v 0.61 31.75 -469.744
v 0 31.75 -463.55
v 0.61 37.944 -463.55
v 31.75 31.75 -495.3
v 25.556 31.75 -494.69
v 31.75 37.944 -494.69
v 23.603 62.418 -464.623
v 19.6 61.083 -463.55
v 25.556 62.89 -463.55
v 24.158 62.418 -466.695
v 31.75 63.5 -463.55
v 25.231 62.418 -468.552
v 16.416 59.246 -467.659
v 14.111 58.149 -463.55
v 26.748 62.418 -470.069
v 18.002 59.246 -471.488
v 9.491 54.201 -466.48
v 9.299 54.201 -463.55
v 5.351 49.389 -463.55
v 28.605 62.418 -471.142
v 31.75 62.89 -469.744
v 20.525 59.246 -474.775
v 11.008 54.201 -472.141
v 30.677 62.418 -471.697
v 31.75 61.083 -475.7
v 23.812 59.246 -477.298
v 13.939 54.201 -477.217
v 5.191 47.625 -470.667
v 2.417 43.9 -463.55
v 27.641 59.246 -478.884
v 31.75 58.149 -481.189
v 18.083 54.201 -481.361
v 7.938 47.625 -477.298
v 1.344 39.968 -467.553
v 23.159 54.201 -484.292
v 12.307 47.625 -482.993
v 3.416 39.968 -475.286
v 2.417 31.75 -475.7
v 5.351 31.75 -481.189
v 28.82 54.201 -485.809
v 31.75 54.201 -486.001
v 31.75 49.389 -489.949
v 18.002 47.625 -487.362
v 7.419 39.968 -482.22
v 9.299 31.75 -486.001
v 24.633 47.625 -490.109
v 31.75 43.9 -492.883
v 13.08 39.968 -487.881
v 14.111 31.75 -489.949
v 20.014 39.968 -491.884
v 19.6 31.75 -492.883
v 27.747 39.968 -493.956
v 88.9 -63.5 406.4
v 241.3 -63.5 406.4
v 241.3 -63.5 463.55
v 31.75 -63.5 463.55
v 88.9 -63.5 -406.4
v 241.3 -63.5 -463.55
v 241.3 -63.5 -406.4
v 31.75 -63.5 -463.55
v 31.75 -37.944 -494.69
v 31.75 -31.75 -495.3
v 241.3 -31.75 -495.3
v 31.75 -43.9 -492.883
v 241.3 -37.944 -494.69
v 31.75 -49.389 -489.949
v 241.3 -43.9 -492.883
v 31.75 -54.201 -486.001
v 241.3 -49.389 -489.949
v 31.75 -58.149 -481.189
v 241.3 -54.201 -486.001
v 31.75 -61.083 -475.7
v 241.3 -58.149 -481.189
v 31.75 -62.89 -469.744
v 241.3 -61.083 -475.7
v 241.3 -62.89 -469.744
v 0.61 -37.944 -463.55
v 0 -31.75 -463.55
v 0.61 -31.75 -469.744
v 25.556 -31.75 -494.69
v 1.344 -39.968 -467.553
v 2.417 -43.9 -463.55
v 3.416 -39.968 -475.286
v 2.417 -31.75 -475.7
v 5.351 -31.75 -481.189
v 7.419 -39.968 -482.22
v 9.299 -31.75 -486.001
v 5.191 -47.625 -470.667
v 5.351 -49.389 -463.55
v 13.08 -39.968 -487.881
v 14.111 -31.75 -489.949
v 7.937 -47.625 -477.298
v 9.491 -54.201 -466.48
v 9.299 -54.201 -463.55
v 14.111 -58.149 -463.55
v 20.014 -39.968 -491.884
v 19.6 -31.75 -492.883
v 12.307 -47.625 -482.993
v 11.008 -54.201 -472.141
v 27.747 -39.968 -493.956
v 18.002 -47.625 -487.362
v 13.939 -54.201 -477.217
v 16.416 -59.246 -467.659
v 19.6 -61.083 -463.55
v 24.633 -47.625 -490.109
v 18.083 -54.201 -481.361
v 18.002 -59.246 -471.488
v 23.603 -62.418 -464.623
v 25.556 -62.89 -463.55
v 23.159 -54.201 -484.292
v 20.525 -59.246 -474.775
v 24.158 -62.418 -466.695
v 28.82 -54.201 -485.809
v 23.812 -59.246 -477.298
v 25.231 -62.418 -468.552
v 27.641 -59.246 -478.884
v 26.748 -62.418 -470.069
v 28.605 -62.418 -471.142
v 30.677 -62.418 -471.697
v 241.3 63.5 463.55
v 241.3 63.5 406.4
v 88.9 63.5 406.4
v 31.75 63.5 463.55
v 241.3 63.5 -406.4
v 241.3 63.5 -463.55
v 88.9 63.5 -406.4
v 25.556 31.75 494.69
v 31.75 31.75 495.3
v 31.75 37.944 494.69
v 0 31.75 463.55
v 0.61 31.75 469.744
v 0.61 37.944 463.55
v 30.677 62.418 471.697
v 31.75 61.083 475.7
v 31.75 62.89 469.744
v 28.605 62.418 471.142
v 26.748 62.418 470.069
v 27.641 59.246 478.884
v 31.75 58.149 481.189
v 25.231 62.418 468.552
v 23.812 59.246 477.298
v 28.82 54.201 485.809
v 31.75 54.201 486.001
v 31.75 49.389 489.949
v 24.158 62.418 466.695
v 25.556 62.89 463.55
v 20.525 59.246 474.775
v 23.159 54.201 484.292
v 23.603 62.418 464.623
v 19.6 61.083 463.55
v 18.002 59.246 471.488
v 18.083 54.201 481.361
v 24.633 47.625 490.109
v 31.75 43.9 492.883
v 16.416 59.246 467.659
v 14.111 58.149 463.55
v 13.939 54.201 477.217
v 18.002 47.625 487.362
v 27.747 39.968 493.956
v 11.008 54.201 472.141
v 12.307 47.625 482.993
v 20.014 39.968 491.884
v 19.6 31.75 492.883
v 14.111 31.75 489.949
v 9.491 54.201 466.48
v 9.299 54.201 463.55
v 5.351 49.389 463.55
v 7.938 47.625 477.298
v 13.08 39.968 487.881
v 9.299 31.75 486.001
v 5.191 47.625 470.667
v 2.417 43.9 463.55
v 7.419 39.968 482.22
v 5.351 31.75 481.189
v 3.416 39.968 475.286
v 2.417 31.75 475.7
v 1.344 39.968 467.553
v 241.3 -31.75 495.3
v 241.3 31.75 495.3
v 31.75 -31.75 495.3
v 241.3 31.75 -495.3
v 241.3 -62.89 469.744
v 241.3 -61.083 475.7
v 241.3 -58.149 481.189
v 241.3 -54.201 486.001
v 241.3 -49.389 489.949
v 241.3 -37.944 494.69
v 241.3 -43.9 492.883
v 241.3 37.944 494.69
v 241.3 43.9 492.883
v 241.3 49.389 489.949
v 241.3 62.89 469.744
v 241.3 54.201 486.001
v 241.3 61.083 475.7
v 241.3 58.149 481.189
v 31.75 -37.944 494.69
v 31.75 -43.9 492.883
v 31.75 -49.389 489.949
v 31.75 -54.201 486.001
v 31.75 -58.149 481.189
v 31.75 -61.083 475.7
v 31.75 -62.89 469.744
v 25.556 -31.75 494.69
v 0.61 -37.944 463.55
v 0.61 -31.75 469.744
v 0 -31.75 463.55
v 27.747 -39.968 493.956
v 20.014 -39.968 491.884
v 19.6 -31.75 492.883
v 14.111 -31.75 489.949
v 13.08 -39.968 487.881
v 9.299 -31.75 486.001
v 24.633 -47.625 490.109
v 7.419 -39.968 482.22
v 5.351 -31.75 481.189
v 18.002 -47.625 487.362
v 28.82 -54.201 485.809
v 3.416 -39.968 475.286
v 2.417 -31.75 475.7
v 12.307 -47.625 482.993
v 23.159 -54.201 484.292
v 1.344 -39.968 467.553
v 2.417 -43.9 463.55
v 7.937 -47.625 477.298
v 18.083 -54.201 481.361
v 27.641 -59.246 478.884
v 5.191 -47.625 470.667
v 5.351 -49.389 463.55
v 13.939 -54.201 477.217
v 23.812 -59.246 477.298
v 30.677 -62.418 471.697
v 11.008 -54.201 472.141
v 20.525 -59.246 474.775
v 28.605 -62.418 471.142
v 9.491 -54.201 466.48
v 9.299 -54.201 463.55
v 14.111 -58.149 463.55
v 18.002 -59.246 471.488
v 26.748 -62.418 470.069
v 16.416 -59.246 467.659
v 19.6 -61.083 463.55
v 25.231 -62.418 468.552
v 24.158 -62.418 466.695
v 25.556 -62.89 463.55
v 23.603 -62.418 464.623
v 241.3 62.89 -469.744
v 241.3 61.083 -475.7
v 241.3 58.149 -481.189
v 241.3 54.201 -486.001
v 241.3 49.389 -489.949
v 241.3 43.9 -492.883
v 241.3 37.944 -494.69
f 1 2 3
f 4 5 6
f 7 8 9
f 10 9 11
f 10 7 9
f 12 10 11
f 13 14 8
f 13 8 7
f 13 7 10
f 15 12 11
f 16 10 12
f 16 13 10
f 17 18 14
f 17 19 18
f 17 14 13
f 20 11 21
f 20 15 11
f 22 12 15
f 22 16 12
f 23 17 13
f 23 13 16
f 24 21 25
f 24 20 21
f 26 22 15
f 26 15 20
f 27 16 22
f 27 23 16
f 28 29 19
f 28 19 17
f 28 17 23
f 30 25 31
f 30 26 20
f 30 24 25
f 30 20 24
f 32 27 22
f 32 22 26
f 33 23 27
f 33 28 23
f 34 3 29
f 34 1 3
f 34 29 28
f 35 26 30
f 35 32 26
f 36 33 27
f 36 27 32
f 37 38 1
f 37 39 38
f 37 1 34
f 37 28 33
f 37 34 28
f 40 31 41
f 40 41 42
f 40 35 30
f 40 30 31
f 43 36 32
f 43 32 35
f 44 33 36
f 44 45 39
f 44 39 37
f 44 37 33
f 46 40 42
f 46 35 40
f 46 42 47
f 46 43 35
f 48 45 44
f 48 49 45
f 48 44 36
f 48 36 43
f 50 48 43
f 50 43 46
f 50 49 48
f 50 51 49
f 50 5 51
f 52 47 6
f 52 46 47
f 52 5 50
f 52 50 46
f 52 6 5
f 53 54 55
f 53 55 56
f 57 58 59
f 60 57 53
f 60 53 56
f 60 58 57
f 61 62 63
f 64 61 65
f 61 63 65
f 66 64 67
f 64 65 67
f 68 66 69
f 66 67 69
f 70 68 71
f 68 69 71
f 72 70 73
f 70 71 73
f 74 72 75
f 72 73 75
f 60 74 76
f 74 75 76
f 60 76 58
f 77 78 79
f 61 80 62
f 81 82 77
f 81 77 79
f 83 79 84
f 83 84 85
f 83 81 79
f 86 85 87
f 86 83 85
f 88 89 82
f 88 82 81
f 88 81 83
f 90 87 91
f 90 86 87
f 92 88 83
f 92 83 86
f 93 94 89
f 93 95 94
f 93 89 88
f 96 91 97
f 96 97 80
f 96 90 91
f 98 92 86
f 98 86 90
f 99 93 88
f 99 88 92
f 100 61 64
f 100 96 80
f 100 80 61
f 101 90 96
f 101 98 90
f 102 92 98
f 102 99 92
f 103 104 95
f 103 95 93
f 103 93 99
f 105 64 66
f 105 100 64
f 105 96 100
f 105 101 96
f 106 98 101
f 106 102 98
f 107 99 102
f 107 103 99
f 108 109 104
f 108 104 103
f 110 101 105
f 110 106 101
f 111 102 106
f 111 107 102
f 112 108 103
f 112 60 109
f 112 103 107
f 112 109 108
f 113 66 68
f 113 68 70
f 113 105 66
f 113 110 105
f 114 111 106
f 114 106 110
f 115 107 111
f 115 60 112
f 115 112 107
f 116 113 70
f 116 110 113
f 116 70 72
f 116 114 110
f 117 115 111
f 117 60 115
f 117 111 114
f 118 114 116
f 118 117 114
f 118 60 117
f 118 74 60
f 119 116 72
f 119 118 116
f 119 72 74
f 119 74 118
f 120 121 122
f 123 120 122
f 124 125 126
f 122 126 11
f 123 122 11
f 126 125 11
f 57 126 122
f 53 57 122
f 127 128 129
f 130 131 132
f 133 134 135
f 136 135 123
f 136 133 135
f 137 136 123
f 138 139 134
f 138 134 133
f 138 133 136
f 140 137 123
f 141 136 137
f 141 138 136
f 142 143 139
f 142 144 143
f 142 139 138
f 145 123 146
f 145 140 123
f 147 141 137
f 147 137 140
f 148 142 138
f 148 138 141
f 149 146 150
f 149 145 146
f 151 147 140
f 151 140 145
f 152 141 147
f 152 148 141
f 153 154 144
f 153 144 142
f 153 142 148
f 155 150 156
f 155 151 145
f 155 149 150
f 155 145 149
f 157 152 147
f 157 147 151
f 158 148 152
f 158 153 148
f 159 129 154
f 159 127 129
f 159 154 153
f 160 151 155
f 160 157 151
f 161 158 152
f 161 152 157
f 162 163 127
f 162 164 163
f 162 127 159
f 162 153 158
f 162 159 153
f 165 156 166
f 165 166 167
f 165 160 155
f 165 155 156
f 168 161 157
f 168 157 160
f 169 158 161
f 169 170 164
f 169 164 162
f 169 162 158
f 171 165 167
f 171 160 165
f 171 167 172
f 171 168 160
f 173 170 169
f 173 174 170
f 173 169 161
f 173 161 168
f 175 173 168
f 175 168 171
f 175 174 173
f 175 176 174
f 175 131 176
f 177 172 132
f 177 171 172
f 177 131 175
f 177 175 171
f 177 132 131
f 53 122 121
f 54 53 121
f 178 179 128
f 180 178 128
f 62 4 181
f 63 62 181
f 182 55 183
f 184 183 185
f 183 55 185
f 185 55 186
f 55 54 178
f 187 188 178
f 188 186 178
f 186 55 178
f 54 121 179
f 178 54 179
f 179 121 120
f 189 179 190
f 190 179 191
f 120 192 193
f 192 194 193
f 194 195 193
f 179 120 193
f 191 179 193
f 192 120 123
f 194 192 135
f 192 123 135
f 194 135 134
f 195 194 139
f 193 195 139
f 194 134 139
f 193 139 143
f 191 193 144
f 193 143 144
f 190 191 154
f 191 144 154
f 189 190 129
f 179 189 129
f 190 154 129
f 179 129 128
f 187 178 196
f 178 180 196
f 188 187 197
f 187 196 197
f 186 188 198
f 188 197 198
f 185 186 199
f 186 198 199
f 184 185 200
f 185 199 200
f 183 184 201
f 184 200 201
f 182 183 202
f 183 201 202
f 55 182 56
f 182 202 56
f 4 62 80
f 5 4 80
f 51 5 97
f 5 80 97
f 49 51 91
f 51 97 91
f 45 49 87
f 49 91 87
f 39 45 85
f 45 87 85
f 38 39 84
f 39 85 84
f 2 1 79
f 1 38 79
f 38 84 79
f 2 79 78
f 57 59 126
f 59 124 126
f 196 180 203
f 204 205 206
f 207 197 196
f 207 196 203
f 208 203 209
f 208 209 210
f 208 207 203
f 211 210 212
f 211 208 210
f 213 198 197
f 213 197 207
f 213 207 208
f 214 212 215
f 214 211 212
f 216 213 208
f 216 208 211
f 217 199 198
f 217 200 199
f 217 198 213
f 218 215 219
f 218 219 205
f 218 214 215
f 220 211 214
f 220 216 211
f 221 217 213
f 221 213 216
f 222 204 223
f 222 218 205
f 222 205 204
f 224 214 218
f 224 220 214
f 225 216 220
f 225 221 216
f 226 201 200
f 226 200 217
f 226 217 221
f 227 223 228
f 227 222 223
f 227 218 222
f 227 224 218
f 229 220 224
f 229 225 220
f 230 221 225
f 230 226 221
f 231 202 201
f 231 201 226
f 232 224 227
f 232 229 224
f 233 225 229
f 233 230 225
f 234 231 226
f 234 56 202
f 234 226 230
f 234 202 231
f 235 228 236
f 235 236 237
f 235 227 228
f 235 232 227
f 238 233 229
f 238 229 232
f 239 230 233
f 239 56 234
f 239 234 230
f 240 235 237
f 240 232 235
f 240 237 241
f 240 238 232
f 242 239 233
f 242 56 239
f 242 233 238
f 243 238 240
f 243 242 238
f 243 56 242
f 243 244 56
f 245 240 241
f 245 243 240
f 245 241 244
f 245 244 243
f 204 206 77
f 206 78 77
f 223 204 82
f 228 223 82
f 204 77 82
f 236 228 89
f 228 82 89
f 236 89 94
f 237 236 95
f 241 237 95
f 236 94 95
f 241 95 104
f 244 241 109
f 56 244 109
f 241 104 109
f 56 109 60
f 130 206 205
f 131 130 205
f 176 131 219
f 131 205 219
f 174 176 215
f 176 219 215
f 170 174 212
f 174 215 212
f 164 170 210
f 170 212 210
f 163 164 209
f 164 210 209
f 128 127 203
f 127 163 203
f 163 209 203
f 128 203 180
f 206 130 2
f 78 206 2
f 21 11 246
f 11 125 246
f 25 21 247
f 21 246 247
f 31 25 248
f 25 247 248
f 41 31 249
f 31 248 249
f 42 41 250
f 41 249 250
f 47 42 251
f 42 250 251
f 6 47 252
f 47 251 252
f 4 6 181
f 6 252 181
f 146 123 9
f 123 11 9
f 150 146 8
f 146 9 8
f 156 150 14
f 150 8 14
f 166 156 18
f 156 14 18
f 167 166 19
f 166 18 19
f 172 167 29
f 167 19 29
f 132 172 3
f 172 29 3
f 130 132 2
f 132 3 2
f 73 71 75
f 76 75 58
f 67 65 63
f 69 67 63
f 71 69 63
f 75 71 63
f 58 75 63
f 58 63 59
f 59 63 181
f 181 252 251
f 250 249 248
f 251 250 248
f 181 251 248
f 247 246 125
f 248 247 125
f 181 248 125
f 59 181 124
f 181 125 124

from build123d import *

# Parameters (mm, degrees)
BOSS_EXTRUDE1_DEPTH = 63.5
FILLET1_R           = 31.75
FILLET2_R           = 31.75


with BuildPart() as part:
    # Sketch2 → Boss-Extrude1 (new body, symmetric)
    with BuildSketch(Plane(origin=(0, 0, 0), x_dir=(1, 0, 0), z_dir=(0, 1, 0))):
        Polygon((241.3, -406.4), (241.3, -495.3), (0, -495.3), (0, 495.3), (241.3, 495.3), (241.3, 406.4), (88.9, 406.4), (88.9, -406.4), align=None)
    extrude(amount=BOSS_EXTRUDE1_DEPTH, both=True)

    # Fillet1
    fillet1_edges = [part.edges().sort_by_distance(p)[0] for p in [
        (0, 0, -495.3),
        (0, 0, 495.3),
    ]]
    fillet(fillet1_edges, radius=FILLET1_R)

    # Fillet2
    fillet2_edges = [part.edges().sort_by_distance(p)[0] for p in [
        (0, -63.5, 0),
        (0, 63.5, 0),
        (136.525, 63.5, -495.3),
        (136.525, -63.5, 495.3),
        (9.299359697, -63.5, 486.000640303),
        (9.299359697, -63.5, -486.000640303),
        (136.525, 63.5, 495.3),
        (9.299359697, 63.5, 486.000640303),
        (9.299359697, 63.5, -486.000640303),
        (136.525, -63.5, -495.3),
    ]]
    fillet(fillet2_edges, radius=FILLET2_R)


solid = part.part
